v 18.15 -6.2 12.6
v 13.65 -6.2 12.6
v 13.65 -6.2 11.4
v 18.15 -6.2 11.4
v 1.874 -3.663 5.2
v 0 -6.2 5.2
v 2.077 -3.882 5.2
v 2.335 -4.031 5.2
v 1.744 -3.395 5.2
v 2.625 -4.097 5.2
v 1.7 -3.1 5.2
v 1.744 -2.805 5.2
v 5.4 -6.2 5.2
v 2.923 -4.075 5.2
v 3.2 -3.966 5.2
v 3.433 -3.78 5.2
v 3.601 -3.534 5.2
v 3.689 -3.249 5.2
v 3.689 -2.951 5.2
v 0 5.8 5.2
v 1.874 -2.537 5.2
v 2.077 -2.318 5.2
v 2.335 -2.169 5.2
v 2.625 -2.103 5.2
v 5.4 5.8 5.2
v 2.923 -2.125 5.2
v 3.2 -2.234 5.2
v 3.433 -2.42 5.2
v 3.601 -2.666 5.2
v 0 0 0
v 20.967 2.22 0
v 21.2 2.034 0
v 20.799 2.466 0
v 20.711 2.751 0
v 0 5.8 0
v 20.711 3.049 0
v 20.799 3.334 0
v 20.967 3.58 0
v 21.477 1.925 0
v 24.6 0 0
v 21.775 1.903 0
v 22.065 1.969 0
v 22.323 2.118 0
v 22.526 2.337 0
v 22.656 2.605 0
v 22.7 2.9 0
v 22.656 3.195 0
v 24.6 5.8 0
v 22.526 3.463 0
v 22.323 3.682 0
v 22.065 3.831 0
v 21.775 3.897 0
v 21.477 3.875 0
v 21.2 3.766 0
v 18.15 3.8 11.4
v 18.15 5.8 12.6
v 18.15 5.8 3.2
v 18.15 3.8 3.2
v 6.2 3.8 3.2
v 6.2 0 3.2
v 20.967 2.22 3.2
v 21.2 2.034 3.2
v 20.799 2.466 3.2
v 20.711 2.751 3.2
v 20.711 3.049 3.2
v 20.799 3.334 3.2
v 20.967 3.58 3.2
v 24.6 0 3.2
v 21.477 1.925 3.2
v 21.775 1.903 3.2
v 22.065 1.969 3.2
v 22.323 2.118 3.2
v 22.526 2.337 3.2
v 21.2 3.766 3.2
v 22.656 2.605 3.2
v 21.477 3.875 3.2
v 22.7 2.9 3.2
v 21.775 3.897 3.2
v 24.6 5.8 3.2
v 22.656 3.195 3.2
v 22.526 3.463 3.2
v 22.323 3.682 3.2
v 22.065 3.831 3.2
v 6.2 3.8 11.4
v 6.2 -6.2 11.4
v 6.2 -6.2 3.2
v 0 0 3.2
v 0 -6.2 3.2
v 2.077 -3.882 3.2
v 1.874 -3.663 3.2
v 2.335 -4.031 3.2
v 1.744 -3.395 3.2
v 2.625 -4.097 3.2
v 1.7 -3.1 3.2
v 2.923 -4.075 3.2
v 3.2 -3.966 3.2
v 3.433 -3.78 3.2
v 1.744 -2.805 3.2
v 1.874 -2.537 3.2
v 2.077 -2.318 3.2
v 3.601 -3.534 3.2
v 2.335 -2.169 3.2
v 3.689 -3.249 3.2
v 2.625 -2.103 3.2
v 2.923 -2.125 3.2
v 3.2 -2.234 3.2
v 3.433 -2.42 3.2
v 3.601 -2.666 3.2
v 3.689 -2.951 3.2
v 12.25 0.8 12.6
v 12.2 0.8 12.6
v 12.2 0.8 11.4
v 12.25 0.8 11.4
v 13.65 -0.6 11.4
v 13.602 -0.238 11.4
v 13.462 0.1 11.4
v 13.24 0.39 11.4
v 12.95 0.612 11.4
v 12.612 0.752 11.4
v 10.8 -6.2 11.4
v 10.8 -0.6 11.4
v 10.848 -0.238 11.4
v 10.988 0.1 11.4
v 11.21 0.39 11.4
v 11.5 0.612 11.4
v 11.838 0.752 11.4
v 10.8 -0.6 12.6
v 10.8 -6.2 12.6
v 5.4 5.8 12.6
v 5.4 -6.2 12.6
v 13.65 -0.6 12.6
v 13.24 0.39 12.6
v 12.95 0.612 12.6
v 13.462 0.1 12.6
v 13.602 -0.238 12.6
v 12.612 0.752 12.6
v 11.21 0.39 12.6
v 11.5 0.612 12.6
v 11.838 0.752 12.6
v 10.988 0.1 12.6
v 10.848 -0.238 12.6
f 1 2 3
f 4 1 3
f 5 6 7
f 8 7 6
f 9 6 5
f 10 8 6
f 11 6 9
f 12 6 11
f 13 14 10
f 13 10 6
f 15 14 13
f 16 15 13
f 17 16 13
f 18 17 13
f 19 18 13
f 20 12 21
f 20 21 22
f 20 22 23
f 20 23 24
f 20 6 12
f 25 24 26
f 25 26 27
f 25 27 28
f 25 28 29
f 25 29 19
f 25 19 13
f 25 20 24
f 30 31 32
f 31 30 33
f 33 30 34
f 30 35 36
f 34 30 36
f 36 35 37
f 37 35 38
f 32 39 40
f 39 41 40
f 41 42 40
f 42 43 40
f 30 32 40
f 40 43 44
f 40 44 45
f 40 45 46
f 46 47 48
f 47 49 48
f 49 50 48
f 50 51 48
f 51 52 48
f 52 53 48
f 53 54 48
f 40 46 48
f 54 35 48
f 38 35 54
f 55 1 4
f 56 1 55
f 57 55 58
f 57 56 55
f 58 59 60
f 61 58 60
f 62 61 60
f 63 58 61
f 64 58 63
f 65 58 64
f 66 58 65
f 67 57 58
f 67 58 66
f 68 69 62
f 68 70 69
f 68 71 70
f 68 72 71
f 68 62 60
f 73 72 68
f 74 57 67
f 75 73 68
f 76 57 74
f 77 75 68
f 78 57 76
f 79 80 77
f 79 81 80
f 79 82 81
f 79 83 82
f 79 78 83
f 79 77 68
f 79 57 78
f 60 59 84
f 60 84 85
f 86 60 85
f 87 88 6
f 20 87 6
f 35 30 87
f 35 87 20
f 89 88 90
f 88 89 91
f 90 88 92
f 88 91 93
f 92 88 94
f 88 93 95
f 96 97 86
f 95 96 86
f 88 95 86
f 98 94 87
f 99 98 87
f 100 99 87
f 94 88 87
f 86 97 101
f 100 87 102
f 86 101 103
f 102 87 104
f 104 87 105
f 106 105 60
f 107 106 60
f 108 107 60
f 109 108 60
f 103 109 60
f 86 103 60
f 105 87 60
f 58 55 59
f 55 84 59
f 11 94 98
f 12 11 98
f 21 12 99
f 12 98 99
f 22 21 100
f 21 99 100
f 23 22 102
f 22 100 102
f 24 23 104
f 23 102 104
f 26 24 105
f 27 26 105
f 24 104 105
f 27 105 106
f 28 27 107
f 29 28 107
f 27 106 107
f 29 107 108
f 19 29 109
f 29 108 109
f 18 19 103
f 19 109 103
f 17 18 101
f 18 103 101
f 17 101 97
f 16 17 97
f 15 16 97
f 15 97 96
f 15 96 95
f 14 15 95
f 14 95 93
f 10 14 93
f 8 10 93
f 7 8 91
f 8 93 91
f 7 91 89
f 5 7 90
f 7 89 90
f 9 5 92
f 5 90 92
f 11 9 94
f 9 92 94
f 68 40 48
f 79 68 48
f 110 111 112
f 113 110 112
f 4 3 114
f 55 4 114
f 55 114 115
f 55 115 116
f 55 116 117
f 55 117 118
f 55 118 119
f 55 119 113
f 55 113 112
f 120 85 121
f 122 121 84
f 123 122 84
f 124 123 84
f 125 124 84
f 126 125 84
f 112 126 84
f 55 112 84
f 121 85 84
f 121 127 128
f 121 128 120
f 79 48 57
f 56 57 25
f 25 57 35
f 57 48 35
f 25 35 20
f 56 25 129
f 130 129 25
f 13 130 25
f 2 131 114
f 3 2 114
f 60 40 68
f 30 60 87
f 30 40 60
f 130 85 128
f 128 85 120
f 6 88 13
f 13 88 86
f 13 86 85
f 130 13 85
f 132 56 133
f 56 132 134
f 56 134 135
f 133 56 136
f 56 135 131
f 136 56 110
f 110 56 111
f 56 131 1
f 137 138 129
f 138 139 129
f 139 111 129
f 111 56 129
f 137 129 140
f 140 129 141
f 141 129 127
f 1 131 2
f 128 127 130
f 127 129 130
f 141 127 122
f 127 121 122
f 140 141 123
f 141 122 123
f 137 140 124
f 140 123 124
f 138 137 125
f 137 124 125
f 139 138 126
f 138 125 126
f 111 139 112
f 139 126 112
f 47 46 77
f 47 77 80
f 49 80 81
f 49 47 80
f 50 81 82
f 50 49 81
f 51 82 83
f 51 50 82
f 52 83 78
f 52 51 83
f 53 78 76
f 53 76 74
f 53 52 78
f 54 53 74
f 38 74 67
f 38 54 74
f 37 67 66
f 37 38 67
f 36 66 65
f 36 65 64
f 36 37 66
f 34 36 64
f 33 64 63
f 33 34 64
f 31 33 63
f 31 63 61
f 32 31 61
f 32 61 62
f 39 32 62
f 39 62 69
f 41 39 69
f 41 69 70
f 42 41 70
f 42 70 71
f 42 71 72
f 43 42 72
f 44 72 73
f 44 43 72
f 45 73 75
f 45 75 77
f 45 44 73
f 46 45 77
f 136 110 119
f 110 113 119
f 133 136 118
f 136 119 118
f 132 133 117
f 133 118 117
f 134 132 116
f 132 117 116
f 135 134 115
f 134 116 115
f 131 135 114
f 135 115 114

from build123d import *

# Parameters (mm, degrees)
SKIZZE1_W                       = 24.6
SKIZZE1_H                       = 5.8
SKIZZE1_R                       = 1
AUFSATZ_LINEAR_AUSTRAGEN1_DEPTH = 3.2
SKIZZE2_W                       = 6.2
SKIZZE2_H                       = 12
AUFSATZ_LINEAR_AUSTRAGEN2_DEPTH = 2
SKIZZE3_R                       = 1
SCHNITT_LINEAR_AUSTRAGEN1_DEPTH = 2
AUFSATZ_LINEAR_AUSTRAGEN3_DEPTH = 8.2
SKIZZE5_W                       = 5.4
SKIZZE5_H                       = 1.2
AUFSATZ_LINEAR_AUSTRAGEN4_DEPTH = 12
SKIZZE6_W                       = 4.6
SKIZZE6_H                       = 8.2
SCHNITT_LINEAR_AUSTRAGEN2_DEPTH = 3.8
AUFSATZ_LINEAR_AUSTRAGEN5_DEPTH = 2.85
AUFSATZ_LINEAR_AUSTRAGEN6_DEPTH = 4.5
VERRUNDUNG1_R                   = 1.4


with BuildPart() as part:
    # Skizze1 → Aufsatz-Linear austragen1 (new body)
    with BuildSketch(Plane.XY):
        with Locations((12.3, 2.9)):
            Rectangle(SKIZZE1_W, SKIZZE1_H)
        with Locations((21.7, 2.9)):
            Circle(SKIZZE1_R, mode=Mode.SUBTRACT)
    extrude(amount=AUFSATZ_LINEAR_AUSTRAGEN1_DEPTH)

    # Skizze2 → Aufsatz-Linear austragen2 (add)
    with BuildSketch(Plane.XY.offset(3.2)):
        with Locations((3.1, -0.2)):
            Rectangle(SKIZZE2_W, SKIZZE2_H)
    extrude(amount=AUFSATZ_LINEAR_AUSTRAGEN2_DEPTH)

    # Skizze3 → Schnitt-Linear austragen1 (cut)
    with BuildSketch(Plane(origin=(0, 0, 3.2), x_dir=(-1, 0, 0), z_dir=(0, 0, -1))):
        with Locations((-2.7, -3.1)):
            Circle(SKIZZE3_R)
    extrude(amount=-SCHNITT_LINEAR_AUSTRAGEN1_DEPTH, mode=Mode.SUBTRACT)

    # Skizze4 → Aufsatz-Linear austragen3 (add)
    with BuildSketch(Plane.XY.offset(3.2)):
        Polygon((6.2, 5.8), (10.8, 5.8), (10.8, 0), (6.2, 0), (6.2, -6.2), (5.4, -6.2), (5.4, 5.8), align=None)
    extrude(amount=AUFSATZ_LINEAR_AUSTRAGEN3_DEPTH)

    # Skizze5 → Aufsatz-Linear austragen4 (add)
    with BuildSketch(Plane(origin=(0, 5.8, 0), x_dir=(1, 0, 0), z_dir=(0, 1, 0))):
        with Locations((8.1, -12)):
            Rectangle(SKIZZE5_W, SKIZZE5_H)
    extrude(amount=-AUFSATZ_LINEAR_AUSTRAGEN4_DEPTH)

    # Skizze6 → Schnitt-Linear austragen2 (cut)
    with BuildSketch(Plane.XZ):
        with Locations((8.5, 7.3)):
            Rectangle(SKIZZE6_W, SKIZZE6_H)
    extrude(amount=-SCHNITT_LINEAR_AUSTRAGEN2_DEPTH, mode=Mode.SUBTRACT)

    # Skizze7 → Aufsatz-Linear austragen5 (add)
    with BuildSketch(Plane(origin=(10.8, 0, 0), x_dir=(0, 0, -1), z_dir=(1, 0, 0))):
        Polygon((-12.6, 5.8), (-12.6, 0.8), (-11.4, 0.8), (-11.4, 3.8), (-3.2, 3.8), (-3.2, 5.8), align=None)
    extrude(amount=AUFSATZ_LINEAR_AUSTRAGEN5_DEPTH)

    # Skizze8 → Aufsatz-Linear austragen6 (add)
    with BuildSketch(Plane(origin=(13.65, 0, 0), x_dir=(0, 0, -1), z_dir=(1, 0, 0))):
        Polygon((-3.2, 5.8), (-12.6, 5.8), (-12.6, -6.2), (-11.4, -6.2), (-11.4, 3.8), (-3.2, 3.8), align=None)
    extrude(amount=AUFSATZ_LINEAR_AUSTRAGEN6_DEPTH)

    # Verrundung1
    verrundung1_edges = [part.edges().sort_by_distance(p)[0] for p in [
        (13.65, 0.8, 12),
        (10.8, 0.8, 12),
    ]]
    fillet(verrundung1_edges, radius=VERRUNDUNG1_R)


solid = part.part
